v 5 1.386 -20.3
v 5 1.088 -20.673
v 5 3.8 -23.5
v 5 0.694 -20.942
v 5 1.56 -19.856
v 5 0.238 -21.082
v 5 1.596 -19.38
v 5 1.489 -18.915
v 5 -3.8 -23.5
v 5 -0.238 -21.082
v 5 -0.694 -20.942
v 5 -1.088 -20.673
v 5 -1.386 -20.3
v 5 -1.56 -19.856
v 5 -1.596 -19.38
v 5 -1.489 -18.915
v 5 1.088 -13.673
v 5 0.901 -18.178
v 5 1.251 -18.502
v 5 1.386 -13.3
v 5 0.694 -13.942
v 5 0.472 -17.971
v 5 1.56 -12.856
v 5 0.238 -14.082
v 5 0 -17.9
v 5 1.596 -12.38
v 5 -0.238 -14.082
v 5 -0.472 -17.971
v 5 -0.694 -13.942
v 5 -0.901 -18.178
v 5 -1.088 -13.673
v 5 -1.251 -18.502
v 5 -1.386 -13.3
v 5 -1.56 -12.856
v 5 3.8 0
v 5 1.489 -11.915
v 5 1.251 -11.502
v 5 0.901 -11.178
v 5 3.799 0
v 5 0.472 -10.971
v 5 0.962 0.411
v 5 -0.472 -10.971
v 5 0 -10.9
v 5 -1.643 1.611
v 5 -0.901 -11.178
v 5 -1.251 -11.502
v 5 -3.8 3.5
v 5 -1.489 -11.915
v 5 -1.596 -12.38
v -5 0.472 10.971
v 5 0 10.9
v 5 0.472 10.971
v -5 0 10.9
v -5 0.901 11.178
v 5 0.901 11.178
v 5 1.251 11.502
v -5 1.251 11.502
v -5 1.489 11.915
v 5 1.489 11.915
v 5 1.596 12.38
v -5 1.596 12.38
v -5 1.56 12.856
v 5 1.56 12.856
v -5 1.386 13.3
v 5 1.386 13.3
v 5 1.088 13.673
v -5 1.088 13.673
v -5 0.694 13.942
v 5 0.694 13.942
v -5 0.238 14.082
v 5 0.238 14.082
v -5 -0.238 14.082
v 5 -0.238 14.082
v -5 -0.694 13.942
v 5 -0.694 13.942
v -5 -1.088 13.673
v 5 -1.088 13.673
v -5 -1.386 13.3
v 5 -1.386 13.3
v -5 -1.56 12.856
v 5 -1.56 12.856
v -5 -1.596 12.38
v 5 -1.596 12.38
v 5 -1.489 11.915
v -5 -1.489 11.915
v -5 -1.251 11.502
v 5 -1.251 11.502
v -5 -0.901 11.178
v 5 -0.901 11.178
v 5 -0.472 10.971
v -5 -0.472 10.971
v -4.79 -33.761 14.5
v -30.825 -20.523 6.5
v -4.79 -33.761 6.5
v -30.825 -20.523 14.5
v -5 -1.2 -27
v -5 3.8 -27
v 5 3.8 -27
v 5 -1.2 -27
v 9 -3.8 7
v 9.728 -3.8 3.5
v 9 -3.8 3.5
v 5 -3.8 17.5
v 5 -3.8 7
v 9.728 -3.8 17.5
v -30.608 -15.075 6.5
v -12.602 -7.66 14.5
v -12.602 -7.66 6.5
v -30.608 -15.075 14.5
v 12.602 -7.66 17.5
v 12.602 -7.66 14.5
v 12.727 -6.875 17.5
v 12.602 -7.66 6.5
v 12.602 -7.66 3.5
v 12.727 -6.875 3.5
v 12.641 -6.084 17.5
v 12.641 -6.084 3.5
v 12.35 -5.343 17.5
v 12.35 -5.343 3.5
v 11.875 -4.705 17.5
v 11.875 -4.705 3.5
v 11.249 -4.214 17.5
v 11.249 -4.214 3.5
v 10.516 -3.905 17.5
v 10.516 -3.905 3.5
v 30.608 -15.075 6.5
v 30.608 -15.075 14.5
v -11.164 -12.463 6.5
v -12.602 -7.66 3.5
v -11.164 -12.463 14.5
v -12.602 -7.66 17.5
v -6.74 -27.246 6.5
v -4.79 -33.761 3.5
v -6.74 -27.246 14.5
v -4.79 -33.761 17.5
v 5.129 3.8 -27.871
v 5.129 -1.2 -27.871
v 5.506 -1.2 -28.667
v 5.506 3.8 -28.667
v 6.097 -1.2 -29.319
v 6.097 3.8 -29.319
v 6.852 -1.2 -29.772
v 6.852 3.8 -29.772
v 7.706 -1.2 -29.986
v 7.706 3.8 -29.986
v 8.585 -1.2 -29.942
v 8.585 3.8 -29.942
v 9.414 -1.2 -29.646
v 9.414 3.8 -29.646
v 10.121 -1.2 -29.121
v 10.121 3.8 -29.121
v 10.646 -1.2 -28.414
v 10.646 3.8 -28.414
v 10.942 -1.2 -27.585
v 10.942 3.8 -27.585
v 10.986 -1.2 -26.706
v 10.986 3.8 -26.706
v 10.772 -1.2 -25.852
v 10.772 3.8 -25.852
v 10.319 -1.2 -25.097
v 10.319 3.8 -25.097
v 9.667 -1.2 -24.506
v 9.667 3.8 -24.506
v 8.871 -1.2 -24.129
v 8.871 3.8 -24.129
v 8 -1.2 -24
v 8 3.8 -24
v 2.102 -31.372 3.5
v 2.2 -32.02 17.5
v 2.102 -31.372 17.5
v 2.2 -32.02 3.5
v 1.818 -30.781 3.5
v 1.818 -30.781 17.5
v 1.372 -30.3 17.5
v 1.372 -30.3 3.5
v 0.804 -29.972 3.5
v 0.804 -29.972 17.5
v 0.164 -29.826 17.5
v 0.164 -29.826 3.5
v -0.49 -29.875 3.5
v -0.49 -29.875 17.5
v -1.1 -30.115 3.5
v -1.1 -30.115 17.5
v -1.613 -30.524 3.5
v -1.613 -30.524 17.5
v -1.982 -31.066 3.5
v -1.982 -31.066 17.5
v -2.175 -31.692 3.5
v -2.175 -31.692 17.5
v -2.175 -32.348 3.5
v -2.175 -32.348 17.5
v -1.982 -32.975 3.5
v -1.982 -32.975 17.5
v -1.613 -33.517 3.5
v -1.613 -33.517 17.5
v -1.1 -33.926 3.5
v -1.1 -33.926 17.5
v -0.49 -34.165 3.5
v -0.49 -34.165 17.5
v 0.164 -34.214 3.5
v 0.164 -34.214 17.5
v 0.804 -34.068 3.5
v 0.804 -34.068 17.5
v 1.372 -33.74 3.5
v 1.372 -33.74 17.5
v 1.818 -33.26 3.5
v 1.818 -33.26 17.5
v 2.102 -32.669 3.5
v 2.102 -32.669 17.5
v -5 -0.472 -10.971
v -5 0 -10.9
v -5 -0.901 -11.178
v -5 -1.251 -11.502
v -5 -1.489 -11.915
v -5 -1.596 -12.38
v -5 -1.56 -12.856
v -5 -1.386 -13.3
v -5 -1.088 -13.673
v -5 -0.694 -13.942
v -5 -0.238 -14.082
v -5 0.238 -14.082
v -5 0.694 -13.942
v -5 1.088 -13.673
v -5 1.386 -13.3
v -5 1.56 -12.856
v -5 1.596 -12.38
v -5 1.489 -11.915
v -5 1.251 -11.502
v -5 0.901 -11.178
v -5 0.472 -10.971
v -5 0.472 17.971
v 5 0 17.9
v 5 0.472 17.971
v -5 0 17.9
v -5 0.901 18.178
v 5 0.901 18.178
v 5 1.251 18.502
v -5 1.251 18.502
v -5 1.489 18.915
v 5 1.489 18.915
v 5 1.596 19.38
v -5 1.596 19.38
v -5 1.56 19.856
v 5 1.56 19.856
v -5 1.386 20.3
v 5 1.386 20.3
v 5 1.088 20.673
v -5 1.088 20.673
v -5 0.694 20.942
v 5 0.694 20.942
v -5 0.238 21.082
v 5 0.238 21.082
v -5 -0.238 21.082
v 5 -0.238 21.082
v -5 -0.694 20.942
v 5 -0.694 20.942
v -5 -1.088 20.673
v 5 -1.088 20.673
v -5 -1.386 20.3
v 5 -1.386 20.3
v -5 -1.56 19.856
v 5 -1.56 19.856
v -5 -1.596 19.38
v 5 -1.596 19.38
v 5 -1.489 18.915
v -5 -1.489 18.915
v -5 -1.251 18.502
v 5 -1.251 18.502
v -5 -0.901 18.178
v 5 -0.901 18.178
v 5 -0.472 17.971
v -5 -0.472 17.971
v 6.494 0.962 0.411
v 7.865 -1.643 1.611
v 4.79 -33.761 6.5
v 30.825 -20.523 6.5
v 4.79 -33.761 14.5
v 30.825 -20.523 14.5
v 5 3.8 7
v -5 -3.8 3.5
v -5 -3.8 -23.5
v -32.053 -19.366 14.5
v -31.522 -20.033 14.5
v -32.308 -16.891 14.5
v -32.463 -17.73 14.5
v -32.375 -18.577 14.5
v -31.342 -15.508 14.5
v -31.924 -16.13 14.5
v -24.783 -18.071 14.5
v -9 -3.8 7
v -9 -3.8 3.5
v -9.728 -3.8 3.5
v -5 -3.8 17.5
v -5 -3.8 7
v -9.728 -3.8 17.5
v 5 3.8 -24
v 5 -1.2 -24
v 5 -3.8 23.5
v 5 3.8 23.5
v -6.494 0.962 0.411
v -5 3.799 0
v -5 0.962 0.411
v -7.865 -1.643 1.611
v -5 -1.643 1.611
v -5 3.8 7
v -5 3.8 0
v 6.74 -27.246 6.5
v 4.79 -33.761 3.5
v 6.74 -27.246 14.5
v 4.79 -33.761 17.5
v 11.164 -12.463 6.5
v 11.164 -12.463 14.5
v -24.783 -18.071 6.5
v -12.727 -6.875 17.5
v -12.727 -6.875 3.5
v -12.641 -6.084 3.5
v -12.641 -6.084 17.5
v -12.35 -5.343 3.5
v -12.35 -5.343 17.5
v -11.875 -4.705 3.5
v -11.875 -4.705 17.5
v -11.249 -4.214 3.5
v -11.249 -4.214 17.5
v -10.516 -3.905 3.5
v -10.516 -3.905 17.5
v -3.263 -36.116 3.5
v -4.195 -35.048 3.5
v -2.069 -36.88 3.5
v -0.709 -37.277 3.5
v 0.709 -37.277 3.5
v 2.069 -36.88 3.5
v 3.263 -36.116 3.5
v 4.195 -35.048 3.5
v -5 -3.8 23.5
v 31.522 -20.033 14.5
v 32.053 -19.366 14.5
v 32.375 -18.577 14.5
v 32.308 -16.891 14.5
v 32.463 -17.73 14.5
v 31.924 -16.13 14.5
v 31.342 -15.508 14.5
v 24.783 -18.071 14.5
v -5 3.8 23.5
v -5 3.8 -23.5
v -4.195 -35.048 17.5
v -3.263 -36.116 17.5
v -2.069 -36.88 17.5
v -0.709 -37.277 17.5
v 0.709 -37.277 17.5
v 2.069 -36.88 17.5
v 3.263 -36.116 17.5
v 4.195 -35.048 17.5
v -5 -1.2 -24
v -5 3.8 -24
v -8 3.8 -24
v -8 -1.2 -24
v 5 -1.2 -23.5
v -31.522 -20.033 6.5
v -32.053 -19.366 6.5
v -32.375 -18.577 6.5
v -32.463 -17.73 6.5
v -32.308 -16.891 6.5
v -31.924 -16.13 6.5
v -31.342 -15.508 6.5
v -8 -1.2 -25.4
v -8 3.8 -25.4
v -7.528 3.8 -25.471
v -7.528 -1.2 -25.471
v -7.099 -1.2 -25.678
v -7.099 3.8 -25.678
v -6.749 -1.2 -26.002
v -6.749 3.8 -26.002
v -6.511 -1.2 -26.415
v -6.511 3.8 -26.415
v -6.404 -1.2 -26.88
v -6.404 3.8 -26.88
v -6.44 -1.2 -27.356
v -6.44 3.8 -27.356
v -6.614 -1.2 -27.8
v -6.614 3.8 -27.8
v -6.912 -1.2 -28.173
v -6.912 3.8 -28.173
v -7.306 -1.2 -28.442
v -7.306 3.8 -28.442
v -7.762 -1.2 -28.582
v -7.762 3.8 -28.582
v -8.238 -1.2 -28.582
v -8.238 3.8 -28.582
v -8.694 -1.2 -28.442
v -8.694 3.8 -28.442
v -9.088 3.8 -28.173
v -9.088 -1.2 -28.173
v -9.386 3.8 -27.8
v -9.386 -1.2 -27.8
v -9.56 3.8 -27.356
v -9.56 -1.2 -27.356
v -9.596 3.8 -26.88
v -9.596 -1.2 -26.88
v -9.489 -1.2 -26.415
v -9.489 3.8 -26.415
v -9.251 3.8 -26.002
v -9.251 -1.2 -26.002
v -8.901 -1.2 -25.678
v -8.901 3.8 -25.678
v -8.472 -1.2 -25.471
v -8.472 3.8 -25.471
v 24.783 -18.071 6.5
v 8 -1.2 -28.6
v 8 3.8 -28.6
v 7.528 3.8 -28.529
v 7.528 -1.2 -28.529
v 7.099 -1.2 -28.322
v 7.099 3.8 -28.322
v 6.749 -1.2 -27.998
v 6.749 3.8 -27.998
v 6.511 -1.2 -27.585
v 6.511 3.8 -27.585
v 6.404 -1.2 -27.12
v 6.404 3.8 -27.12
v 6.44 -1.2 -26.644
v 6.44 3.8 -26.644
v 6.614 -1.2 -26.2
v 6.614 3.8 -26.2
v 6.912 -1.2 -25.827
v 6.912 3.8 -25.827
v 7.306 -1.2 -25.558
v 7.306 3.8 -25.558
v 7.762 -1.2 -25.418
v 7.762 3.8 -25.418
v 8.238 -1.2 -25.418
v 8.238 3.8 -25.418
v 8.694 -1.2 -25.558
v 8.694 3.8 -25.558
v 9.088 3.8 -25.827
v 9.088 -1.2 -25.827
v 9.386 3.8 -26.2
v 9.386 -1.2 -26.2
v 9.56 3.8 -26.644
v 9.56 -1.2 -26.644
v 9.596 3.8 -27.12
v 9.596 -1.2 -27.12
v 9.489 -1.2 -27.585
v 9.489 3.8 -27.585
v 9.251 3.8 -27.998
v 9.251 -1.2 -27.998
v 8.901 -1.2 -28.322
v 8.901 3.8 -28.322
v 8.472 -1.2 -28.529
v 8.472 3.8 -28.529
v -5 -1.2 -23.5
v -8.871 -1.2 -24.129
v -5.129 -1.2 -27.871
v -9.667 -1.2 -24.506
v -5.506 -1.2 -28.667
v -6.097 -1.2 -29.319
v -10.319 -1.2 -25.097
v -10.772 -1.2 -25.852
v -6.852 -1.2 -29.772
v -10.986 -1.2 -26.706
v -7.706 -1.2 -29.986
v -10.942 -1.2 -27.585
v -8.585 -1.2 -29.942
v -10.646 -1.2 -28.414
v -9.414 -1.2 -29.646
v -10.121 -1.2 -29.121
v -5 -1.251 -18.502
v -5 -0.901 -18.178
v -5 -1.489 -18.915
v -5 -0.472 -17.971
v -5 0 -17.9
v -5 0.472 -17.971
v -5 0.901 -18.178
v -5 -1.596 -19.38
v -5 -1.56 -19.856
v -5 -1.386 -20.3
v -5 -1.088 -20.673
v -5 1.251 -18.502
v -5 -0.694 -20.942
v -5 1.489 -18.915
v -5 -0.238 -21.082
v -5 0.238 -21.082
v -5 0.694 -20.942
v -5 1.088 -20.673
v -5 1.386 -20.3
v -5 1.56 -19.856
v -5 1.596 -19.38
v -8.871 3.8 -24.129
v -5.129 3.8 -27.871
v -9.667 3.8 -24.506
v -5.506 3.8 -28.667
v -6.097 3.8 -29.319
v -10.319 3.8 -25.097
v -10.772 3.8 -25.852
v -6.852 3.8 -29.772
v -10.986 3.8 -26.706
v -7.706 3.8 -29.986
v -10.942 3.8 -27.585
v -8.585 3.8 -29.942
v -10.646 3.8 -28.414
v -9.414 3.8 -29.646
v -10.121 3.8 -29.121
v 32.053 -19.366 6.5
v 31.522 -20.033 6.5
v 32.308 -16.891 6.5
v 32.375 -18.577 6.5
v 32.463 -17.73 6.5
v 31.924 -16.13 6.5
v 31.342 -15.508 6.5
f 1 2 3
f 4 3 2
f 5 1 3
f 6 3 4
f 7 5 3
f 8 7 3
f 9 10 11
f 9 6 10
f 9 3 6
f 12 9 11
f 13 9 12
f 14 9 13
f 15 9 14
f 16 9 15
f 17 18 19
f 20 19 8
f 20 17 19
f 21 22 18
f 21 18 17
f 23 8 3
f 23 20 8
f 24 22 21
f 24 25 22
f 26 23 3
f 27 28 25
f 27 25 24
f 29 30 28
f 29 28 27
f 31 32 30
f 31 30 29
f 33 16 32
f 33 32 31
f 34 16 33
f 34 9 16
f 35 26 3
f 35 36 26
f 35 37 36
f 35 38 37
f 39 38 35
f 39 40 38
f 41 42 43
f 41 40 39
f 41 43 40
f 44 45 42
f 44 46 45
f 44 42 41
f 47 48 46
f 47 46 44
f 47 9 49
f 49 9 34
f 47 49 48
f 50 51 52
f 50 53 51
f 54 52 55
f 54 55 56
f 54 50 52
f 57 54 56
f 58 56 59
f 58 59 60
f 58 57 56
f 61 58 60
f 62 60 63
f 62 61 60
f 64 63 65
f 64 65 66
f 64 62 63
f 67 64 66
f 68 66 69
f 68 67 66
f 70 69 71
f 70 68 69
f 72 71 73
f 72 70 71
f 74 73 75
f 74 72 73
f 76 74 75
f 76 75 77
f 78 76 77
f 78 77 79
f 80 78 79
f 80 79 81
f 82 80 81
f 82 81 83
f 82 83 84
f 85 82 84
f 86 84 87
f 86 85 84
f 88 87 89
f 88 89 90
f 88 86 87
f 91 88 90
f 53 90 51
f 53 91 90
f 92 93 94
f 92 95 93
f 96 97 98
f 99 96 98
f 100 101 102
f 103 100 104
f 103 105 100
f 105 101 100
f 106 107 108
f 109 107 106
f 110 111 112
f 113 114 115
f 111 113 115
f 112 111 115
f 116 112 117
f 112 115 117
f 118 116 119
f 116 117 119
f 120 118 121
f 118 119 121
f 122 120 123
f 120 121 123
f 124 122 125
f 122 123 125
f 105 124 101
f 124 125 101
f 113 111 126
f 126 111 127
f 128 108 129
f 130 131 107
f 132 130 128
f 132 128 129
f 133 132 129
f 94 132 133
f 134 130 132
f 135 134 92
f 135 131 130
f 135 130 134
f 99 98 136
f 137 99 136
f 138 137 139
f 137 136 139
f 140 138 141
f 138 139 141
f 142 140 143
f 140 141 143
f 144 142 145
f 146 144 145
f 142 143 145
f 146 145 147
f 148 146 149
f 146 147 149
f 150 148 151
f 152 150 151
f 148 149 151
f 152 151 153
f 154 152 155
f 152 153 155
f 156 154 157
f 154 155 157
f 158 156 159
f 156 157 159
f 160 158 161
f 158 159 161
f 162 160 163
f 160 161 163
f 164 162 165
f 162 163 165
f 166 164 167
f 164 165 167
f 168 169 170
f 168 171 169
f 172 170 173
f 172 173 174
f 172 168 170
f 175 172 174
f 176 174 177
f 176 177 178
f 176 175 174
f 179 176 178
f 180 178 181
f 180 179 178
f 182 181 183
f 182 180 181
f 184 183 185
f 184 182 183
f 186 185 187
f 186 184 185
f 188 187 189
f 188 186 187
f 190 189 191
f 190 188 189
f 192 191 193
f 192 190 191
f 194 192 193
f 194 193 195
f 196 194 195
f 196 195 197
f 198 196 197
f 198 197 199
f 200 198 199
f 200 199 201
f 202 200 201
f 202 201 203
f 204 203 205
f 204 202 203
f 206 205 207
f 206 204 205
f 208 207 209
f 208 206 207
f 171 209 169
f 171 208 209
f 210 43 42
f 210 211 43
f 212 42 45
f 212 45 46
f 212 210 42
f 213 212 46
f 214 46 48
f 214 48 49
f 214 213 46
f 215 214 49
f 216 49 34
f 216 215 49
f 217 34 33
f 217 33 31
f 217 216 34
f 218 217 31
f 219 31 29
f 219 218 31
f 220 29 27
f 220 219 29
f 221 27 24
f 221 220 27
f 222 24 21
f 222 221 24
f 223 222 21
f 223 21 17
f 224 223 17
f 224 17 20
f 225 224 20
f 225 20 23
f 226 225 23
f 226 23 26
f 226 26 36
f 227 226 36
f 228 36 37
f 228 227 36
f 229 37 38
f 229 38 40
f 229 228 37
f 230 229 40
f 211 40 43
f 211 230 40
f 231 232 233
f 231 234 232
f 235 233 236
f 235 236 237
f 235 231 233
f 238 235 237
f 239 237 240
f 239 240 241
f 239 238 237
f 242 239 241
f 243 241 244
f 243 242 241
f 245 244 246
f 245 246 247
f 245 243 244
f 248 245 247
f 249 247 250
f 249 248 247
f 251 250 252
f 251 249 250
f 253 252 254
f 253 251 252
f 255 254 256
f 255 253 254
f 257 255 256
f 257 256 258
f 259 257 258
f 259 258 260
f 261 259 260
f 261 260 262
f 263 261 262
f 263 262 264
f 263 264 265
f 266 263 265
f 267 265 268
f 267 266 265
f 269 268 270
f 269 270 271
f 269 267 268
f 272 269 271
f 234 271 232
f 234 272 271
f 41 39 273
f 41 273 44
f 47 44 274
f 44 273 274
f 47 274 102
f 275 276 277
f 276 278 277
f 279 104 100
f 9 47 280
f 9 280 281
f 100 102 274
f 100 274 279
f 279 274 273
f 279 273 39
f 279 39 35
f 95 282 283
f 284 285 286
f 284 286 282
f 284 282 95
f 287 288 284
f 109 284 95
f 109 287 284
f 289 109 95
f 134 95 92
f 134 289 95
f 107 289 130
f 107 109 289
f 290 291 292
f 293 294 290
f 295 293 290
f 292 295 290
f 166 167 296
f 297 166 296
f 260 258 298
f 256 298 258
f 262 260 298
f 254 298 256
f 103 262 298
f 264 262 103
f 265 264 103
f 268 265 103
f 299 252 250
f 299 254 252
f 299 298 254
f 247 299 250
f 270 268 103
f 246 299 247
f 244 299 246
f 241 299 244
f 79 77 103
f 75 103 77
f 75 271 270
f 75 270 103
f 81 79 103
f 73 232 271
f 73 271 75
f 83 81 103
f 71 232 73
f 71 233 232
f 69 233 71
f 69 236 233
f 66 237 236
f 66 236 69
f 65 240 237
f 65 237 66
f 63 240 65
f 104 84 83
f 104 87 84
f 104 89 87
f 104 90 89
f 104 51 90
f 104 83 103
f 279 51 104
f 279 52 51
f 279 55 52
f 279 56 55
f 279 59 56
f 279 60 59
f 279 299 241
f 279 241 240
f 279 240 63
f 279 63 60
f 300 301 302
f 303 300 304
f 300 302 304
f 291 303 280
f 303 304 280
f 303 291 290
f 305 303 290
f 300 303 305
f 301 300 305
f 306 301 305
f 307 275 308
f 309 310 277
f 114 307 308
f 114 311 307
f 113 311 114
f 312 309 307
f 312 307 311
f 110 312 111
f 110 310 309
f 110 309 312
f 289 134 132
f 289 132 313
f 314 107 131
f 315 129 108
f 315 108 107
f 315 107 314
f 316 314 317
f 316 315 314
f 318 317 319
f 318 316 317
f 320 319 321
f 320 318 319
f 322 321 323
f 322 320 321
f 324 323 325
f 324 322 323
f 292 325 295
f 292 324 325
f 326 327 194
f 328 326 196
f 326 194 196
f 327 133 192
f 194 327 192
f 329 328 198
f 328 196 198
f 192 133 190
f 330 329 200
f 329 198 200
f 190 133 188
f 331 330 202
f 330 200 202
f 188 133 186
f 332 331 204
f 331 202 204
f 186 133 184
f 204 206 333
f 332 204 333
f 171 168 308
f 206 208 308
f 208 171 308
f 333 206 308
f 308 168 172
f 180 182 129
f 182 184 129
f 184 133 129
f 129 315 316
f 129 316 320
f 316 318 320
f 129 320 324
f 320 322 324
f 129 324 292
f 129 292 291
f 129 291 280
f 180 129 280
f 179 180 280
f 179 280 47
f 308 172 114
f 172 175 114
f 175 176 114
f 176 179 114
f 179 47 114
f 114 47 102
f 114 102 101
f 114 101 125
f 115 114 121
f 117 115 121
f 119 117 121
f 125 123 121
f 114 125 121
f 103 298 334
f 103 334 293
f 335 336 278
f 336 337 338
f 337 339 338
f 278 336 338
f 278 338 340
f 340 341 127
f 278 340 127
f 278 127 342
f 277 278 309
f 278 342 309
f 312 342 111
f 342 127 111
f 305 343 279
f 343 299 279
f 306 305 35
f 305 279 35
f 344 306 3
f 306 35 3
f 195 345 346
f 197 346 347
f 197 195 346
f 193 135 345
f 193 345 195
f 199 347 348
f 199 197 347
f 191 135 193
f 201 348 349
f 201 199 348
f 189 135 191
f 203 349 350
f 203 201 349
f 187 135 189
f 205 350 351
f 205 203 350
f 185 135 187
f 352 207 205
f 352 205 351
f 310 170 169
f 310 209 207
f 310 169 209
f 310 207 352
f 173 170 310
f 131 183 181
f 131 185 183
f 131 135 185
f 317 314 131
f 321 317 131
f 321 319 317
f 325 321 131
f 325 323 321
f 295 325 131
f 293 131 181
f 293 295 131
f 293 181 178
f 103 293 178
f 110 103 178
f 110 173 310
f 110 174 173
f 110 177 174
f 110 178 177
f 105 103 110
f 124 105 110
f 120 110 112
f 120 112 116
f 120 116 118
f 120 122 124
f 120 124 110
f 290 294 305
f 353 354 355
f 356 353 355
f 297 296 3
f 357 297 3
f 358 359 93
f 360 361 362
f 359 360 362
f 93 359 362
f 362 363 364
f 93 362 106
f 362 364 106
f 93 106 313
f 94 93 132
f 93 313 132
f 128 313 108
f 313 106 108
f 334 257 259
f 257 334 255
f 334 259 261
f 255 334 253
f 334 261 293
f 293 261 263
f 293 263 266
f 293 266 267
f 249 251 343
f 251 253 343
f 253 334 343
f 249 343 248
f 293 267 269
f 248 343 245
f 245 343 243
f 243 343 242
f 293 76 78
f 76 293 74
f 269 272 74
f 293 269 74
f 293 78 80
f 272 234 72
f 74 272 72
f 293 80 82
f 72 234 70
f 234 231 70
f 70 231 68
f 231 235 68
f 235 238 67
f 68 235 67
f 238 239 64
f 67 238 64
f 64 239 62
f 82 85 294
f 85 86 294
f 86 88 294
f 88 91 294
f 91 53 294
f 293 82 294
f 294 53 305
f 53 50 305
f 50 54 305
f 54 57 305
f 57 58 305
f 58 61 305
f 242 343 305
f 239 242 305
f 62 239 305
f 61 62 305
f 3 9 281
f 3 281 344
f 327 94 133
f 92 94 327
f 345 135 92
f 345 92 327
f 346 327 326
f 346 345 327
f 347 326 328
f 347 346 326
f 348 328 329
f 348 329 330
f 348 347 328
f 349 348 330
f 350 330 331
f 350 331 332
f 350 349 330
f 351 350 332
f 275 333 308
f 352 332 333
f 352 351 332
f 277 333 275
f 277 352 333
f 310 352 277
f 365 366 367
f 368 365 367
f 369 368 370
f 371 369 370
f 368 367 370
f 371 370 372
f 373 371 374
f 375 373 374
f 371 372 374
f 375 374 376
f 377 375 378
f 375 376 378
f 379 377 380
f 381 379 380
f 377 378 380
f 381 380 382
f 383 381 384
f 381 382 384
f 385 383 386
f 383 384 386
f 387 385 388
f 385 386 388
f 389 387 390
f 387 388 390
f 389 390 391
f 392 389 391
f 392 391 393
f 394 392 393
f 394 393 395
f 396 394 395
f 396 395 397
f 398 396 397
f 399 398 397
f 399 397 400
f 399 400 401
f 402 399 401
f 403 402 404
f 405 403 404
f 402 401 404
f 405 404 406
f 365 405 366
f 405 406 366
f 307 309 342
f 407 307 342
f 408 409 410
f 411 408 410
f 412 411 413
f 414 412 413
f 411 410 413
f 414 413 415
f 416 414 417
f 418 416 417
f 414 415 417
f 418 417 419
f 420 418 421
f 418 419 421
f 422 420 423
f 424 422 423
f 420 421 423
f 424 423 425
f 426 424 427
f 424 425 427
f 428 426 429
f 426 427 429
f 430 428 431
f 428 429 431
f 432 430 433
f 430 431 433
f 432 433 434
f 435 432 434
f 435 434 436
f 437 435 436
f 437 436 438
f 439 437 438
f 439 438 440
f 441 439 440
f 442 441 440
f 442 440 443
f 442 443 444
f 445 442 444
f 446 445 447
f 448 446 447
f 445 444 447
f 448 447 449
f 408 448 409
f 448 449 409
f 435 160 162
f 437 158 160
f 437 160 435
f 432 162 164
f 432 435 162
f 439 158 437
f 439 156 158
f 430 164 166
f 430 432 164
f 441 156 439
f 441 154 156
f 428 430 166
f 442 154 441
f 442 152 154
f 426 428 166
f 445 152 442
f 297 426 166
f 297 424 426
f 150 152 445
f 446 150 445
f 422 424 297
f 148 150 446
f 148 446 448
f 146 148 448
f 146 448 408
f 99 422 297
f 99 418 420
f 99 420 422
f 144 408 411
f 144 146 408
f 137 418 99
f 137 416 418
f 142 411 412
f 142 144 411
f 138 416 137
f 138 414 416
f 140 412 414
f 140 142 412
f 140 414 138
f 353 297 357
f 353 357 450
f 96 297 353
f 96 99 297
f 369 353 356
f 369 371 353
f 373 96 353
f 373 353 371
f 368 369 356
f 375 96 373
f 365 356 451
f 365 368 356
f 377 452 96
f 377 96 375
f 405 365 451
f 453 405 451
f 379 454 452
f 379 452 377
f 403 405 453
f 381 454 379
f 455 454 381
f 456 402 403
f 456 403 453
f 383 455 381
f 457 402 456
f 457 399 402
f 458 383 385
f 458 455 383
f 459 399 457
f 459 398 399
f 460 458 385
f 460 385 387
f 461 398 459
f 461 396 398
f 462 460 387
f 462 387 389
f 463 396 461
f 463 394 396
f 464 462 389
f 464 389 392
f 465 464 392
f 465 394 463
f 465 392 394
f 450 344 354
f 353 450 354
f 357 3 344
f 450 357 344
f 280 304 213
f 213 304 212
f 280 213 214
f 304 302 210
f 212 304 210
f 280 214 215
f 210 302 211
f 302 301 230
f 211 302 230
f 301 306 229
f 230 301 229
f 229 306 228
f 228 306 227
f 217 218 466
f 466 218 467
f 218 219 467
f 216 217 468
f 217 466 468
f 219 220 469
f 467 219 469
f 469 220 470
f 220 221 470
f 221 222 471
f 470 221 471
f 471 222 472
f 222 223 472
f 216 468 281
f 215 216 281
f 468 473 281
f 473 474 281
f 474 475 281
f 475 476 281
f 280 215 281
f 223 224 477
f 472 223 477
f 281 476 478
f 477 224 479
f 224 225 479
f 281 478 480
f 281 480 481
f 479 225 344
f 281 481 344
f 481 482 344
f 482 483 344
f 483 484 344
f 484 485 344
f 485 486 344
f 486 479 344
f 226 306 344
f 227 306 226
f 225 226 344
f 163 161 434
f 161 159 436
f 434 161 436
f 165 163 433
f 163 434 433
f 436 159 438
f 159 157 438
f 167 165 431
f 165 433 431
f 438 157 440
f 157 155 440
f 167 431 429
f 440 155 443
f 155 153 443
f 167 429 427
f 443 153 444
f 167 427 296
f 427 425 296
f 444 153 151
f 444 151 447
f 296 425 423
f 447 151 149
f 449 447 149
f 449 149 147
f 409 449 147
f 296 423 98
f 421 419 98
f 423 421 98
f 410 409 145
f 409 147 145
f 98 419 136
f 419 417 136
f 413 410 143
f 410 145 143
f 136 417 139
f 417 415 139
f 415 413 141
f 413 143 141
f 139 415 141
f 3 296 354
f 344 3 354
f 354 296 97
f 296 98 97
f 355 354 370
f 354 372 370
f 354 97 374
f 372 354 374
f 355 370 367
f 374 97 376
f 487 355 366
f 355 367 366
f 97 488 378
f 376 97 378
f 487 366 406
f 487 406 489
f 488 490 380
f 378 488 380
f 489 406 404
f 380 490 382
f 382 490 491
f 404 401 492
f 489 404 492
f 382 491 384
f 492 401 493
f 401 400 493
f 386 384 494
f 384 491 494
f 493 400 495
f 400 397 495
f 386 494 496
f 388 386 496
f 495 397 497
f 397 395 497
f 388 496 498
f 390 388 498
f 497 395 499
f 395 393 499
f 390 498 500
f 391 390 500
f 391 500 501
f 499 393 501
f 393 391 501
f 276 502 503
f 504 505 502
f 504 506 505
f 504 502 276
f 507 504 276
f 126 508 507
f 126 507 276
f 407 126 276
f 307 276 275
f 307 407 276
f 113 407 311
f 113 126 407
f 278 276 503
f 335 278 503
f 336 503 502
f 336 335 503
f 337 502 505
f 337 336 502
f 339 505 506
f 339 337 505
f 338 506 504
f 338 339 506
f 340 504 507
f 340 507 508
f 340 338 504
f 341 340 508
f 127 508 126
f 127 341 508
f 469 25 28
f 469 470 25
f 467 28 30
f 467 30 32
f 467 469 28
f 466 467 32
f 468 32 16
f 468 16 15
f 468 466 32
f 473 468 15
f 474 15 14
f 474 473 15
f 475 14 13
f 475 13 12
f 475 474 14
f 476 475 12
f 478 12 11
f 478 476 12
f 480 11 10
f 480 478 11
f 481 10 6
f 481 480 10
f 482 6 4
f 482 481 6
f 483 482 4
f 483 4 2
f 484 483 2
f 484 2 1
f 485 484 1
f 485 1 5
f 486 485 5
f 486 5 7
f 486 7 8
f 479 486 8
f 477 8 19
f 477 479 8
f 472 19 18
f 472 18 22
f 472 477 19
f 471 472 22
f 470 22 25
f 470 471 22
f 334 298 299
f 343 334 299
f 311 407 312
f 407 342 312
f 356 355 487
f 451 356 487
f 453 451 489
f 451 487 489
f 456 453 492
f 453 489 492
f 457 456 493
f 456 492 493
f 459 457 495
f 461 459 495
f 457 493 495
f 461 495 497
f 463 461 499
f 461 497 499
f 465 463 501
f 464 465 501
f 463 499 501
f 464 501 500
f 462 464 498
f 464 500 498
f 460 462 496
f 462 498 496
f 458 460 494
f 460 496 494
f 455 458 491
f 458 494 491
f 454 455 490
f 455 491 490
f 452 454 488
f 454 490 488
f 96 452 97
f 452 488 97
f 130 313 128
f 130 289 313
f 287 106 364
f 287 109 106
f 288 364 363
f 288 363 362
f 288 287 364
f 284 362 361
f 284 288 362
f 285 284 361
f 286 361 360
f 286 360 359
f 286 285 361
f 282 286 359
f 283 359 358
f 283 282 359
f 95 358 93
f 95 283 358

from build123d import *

# Parameters (mm, degrees)
SKETCH_1_W             = 47
SKETCH_1_H             = 7.6
SKETCH_1_R             = 1.6
EXTRUDE_1_DEPTH        = 5
EXTRUDE_3_DEPTH        = 7
SKETCH_3_R             = 2.2
EXTRUDE_2_DEPTH        = 7
FILLET_1_R             = 5
FILLET_2_R             = 3
FILLET_4_R             = 10
EXTRUDE_4_DEPTH        = 4
FILLET_3_R             = 3
FILLET_3_OF_MIRROR_1_R = 3
SKETCH_6_R             = 1.6
EXTRUDE_5_DEPTH        = 5


with BuildPart() as part:
    # 草图1 → 凸台-拉伸1 (new, symmetric)
    with BuildSketch(Plane(origin=(0, 0, 0), x_dir=(0, 0, -1), z_dir=(1, 0, 0))):
        Rectangle(SKETCH_1_W, SKETCH_1_H)
        with Locations((-19.5, 0)):
            Circle(SKETCH_1_R, mode=Mode.SUBTRACT)
        with Locations((-12.5, 0)):
            Circle(SKETCH_1_R, mode=Mode.SUBTRACT)
        with Locations(Location((12.5, 0, 0), (0, 0, 180))):
            Circle(SKETCH_1_R, mode=Mode.SUBTRACT)
        with Locations(Location((19.5, 0, 0), (0, 0, 180))):
            Circle(SKETCH_1_R, mode=Mode.SUBTRACT)
    extrude(amount=EXTRUDE_1_DEPTH, both=True)

    # 草图4 → 凸台-拉伸3 (add)
    with BuildSketch(Plane.XY):
        Polygon((5, 3.8), (5, -3.8), (9, -3.8), align=None)
        Polygon((-5, -3.8), (-9, -3.8), (-5, 3.8), align=None)
    extrude(amount=EXTRUDE_3_DEPTH)

    # 草图3 → 凸台-拉伸2 (add, symmetric)
    with BuildSketch(Plane.XY.offset(10.5)):
        Polygon((0, -3.8), (-13.756900678, -3.8), (0, -49.766728974), (13.756900678, -3.8), align=None)
        with Locations((0, -32.020277262)):
            Circle(SKETCH_3_R, mode=Mode.SUBTRACT)
    extrude(amount=EXTRUDE_2_DEPTH, both=True)

    # 圆角1
    fillet_1_edges = [part.edges().sort_by_distance(p)[0] for p in [
        (0, -49.766728974, 10.5),
    ]]
    fillet(fillet_1_edges, radius=FILLET_1_R)

    # 圆角2
    fillet_2_edges = [part.edges().sort_by_distance(p)[0] for p in [
        (13.756900678, -3.8, 10.5),
        (-13.756900678, -3.8, 10.5),
    ]]
    fillet(fillet_2_edges, radius=FILLET_2_R)

    # 圆角4
    # the kernel refuses this fillet: 10 mm, written as the material it takes off along each edge
    with BuildSketch(Plane(origin=(13.998355192, -3.8, 0), x_dir=(0, 0, 1), z_dir=(-1, 0, 0))) as fillet_4_piece_1_section:
        with BuildLine():
            CenterArc((10, 7.599342077), FILLET_4_R, 180, 49.458398126)
            Line((0, 7.599342077), (-0.2, 7.599342077))
            Line((-0.2, 7.599342077), (-0.2, 0))
            Line((-0.2, 0), (0, -0.2))
            ThreePointArc((0, -0.2), (1.75, -0.2), (3.37, -0.151986842))
            Line((3.37, -0.151986842), (3.5, 0))
        make_face()
    fillet_4_piece_1 = extrude(amount=41.996710384, mode=Mode.PRIVATE)
    fillet_4_piece_1 = split(fillet_4_piece_1, bisect_by=Plane(origin=(5, -1.809246977, 0.883967922), z_dir=(1, 0, 0)), keep=Keep.TOP, mode=Mode.PRIVATE)
    add(fillet_4_piece_1, mode=Mode.SUBTRACT)
    with BuildSketch(Plane(origin=(-5, -3.8, 0), x_dir=(0, 0, 1), z_dir=(-1, 0, 0))) as fillet_4_piece_2:
        with BuildLine():
            CenterArc((10, 7.599342077), FILLET_4_R, 180, 49.458398126)
            Line((0, 7.599342077), (-0.2, 7.599342077))
            Line((-0.2, 7.599342077), (-0.2, 0))
            Line((-0.2, 0), (0, -0.2))
            ThreePointArc((0, -0.2), (1.75, -0.2), (3.37, -0.151986842))
            Line((3.37, -0.151986842), (3.5, 0))
        make_face()
    extrude(amount=22.998355192, mode=Mode.SUBTRACT)
    with BuildSketch(Plane(origin=(-13.998355192, -3.8, 0), x_dir=(0, 0, 1), z_dir=(1, 0, 0))) as fillet_4_piece_3_section:
        with BuildLine():
            CenterArc((10, -7.599342077), FILLET_4_R, 130.541601874, 49.458398126)
            Line((0, -7.599342077), (-0.2, -7.599342077))
            Line((-0.2, -7.599342077), (-0.2, 0))
            Line((-0.2, 0), (0, 0.2))
            ThreePointArc((0, 0.2), (1.75, 0.2), (3.37, 0.151986842))
            Line((3.37, 0.151986842), (3.5, 0))
        make_face()
    fillet_4_piece_3 = extrude(amount=41.996710384, mode=Mode.PRIVATE)
    fillet_4_piece_3 = split(fillet_4_piece_3, bisect_by=Plane(origin=(-5, -1.809246977, 0.883967922), z_dir=(-1, 0, 0)), keep=Keep.TOP, mode=Mode.PRIVATE)
    add(fillet_4_piece_3, mode=Mode.SUBTRACT)
    with BuildSketch(Plane(origin=(5, -3.8, 0), x_dir=(0, 0, 1), z_dir=(1, 0, 0))) as fillet_4_piece_4:
        with BuildLine():
            CenterArc((10, -7.599342077), FILLET_4_R, 130.541601874, 49.458398126)
            Line((0, -7.599342077), (-0.2, -7.599342077))
            Line((-0.2, -7.599342077), (-0.2, 0))
            Line((-0.2, 0), (0, 0.2))
            ThreePointArc((0, 0.2), (1.75, 0.2), (3.37, 0.151986842))
            Line((3.37, 0.151986842), (3.5, 0))
        make_face()
    extrude(amount=22.998355192, mode=Mode.SUBTRACT)

    # 草图5 → 凸台-拉伸4 (add, symmetric)
    with BuildSketch(Plane.XY.offset(10.5)):
        Polygon((-12.6016387, -7.660143754), (-36.64770265, -17.562543764), (-4.790080237, -33.761356459), (-6.740083912, -27.245696244), (-24.782770498, -18.071436573), (-11.164189994, -12.463174365), align=None)
    extrude_4 = extrude(amount=EXTRUDE_4_DEPTH, both=True)

    # 圆角3
    fillet_3_edges = [part.edges().sort_by_distance(p)[0] for p in [
        (-36.64770265, -17.562543764, 10.5),
    ]]
    fillet(fillet_3_edges, radius=FILLET_3_R)

    # 镜向1: 凸台-拉伸4 across plane
    add(extrude_4.mirror(Plane(origin=(0, 0, 0), x_dir=(0, 0, 1), z_dir=(1, 0, 0))))

    # 圆角3 of 镜向1
    fillet_3_of_mirror_1_edges = [part.edges().sort_by_distance(p)[0] for p in [
        (36.64770265, -17.562543764, 10.5),
    ]]
    fillet(fillet_3_of_mirror_1_edges, radius=FILLET_3_OF_MIRROR_1_R)


with BuildPart() as body_2:
    # 草图6 → 凸台-拉伸5 (new body)
    with BuildSketch(Plane(origin=(0, 3.8, 0), x_dir=(1, 0, 0), z_dir=(0, 1, 0))):
        with BuildLine():
            Line((-5, 23.5), (-5, 24))
            Line((-5, 24), (-8, 24))
            ThreePointArc((-8, 24), (-10.121320344, 29.121320344), (-5, 27))
            Line((-5, 27), (5, 27))
            ThreePointArc((5, 27), (10.121320344, 29.121320344), (8, 24))
            Line((8, 24), (5, 24))
            Line((5, 24), (5, 23.5))
            Line((5, 23.5), (-5, 23.5))
        make_face()
        with Locations(Location((-8, 27, 0), (0, 0, 270))):
            Circle(SKETCH_6_R, mode=Mode.SUBTRACT)
        with Locations(Location((8, 27, 0), (0, 0, 90))):
            Circle(SKETCH_6_R, mode=Mode.SUBTRACT)
    extrude(amount=-EXTRUDE_5_DEPTH)


solid = Compound([part.part, body_2.part])
